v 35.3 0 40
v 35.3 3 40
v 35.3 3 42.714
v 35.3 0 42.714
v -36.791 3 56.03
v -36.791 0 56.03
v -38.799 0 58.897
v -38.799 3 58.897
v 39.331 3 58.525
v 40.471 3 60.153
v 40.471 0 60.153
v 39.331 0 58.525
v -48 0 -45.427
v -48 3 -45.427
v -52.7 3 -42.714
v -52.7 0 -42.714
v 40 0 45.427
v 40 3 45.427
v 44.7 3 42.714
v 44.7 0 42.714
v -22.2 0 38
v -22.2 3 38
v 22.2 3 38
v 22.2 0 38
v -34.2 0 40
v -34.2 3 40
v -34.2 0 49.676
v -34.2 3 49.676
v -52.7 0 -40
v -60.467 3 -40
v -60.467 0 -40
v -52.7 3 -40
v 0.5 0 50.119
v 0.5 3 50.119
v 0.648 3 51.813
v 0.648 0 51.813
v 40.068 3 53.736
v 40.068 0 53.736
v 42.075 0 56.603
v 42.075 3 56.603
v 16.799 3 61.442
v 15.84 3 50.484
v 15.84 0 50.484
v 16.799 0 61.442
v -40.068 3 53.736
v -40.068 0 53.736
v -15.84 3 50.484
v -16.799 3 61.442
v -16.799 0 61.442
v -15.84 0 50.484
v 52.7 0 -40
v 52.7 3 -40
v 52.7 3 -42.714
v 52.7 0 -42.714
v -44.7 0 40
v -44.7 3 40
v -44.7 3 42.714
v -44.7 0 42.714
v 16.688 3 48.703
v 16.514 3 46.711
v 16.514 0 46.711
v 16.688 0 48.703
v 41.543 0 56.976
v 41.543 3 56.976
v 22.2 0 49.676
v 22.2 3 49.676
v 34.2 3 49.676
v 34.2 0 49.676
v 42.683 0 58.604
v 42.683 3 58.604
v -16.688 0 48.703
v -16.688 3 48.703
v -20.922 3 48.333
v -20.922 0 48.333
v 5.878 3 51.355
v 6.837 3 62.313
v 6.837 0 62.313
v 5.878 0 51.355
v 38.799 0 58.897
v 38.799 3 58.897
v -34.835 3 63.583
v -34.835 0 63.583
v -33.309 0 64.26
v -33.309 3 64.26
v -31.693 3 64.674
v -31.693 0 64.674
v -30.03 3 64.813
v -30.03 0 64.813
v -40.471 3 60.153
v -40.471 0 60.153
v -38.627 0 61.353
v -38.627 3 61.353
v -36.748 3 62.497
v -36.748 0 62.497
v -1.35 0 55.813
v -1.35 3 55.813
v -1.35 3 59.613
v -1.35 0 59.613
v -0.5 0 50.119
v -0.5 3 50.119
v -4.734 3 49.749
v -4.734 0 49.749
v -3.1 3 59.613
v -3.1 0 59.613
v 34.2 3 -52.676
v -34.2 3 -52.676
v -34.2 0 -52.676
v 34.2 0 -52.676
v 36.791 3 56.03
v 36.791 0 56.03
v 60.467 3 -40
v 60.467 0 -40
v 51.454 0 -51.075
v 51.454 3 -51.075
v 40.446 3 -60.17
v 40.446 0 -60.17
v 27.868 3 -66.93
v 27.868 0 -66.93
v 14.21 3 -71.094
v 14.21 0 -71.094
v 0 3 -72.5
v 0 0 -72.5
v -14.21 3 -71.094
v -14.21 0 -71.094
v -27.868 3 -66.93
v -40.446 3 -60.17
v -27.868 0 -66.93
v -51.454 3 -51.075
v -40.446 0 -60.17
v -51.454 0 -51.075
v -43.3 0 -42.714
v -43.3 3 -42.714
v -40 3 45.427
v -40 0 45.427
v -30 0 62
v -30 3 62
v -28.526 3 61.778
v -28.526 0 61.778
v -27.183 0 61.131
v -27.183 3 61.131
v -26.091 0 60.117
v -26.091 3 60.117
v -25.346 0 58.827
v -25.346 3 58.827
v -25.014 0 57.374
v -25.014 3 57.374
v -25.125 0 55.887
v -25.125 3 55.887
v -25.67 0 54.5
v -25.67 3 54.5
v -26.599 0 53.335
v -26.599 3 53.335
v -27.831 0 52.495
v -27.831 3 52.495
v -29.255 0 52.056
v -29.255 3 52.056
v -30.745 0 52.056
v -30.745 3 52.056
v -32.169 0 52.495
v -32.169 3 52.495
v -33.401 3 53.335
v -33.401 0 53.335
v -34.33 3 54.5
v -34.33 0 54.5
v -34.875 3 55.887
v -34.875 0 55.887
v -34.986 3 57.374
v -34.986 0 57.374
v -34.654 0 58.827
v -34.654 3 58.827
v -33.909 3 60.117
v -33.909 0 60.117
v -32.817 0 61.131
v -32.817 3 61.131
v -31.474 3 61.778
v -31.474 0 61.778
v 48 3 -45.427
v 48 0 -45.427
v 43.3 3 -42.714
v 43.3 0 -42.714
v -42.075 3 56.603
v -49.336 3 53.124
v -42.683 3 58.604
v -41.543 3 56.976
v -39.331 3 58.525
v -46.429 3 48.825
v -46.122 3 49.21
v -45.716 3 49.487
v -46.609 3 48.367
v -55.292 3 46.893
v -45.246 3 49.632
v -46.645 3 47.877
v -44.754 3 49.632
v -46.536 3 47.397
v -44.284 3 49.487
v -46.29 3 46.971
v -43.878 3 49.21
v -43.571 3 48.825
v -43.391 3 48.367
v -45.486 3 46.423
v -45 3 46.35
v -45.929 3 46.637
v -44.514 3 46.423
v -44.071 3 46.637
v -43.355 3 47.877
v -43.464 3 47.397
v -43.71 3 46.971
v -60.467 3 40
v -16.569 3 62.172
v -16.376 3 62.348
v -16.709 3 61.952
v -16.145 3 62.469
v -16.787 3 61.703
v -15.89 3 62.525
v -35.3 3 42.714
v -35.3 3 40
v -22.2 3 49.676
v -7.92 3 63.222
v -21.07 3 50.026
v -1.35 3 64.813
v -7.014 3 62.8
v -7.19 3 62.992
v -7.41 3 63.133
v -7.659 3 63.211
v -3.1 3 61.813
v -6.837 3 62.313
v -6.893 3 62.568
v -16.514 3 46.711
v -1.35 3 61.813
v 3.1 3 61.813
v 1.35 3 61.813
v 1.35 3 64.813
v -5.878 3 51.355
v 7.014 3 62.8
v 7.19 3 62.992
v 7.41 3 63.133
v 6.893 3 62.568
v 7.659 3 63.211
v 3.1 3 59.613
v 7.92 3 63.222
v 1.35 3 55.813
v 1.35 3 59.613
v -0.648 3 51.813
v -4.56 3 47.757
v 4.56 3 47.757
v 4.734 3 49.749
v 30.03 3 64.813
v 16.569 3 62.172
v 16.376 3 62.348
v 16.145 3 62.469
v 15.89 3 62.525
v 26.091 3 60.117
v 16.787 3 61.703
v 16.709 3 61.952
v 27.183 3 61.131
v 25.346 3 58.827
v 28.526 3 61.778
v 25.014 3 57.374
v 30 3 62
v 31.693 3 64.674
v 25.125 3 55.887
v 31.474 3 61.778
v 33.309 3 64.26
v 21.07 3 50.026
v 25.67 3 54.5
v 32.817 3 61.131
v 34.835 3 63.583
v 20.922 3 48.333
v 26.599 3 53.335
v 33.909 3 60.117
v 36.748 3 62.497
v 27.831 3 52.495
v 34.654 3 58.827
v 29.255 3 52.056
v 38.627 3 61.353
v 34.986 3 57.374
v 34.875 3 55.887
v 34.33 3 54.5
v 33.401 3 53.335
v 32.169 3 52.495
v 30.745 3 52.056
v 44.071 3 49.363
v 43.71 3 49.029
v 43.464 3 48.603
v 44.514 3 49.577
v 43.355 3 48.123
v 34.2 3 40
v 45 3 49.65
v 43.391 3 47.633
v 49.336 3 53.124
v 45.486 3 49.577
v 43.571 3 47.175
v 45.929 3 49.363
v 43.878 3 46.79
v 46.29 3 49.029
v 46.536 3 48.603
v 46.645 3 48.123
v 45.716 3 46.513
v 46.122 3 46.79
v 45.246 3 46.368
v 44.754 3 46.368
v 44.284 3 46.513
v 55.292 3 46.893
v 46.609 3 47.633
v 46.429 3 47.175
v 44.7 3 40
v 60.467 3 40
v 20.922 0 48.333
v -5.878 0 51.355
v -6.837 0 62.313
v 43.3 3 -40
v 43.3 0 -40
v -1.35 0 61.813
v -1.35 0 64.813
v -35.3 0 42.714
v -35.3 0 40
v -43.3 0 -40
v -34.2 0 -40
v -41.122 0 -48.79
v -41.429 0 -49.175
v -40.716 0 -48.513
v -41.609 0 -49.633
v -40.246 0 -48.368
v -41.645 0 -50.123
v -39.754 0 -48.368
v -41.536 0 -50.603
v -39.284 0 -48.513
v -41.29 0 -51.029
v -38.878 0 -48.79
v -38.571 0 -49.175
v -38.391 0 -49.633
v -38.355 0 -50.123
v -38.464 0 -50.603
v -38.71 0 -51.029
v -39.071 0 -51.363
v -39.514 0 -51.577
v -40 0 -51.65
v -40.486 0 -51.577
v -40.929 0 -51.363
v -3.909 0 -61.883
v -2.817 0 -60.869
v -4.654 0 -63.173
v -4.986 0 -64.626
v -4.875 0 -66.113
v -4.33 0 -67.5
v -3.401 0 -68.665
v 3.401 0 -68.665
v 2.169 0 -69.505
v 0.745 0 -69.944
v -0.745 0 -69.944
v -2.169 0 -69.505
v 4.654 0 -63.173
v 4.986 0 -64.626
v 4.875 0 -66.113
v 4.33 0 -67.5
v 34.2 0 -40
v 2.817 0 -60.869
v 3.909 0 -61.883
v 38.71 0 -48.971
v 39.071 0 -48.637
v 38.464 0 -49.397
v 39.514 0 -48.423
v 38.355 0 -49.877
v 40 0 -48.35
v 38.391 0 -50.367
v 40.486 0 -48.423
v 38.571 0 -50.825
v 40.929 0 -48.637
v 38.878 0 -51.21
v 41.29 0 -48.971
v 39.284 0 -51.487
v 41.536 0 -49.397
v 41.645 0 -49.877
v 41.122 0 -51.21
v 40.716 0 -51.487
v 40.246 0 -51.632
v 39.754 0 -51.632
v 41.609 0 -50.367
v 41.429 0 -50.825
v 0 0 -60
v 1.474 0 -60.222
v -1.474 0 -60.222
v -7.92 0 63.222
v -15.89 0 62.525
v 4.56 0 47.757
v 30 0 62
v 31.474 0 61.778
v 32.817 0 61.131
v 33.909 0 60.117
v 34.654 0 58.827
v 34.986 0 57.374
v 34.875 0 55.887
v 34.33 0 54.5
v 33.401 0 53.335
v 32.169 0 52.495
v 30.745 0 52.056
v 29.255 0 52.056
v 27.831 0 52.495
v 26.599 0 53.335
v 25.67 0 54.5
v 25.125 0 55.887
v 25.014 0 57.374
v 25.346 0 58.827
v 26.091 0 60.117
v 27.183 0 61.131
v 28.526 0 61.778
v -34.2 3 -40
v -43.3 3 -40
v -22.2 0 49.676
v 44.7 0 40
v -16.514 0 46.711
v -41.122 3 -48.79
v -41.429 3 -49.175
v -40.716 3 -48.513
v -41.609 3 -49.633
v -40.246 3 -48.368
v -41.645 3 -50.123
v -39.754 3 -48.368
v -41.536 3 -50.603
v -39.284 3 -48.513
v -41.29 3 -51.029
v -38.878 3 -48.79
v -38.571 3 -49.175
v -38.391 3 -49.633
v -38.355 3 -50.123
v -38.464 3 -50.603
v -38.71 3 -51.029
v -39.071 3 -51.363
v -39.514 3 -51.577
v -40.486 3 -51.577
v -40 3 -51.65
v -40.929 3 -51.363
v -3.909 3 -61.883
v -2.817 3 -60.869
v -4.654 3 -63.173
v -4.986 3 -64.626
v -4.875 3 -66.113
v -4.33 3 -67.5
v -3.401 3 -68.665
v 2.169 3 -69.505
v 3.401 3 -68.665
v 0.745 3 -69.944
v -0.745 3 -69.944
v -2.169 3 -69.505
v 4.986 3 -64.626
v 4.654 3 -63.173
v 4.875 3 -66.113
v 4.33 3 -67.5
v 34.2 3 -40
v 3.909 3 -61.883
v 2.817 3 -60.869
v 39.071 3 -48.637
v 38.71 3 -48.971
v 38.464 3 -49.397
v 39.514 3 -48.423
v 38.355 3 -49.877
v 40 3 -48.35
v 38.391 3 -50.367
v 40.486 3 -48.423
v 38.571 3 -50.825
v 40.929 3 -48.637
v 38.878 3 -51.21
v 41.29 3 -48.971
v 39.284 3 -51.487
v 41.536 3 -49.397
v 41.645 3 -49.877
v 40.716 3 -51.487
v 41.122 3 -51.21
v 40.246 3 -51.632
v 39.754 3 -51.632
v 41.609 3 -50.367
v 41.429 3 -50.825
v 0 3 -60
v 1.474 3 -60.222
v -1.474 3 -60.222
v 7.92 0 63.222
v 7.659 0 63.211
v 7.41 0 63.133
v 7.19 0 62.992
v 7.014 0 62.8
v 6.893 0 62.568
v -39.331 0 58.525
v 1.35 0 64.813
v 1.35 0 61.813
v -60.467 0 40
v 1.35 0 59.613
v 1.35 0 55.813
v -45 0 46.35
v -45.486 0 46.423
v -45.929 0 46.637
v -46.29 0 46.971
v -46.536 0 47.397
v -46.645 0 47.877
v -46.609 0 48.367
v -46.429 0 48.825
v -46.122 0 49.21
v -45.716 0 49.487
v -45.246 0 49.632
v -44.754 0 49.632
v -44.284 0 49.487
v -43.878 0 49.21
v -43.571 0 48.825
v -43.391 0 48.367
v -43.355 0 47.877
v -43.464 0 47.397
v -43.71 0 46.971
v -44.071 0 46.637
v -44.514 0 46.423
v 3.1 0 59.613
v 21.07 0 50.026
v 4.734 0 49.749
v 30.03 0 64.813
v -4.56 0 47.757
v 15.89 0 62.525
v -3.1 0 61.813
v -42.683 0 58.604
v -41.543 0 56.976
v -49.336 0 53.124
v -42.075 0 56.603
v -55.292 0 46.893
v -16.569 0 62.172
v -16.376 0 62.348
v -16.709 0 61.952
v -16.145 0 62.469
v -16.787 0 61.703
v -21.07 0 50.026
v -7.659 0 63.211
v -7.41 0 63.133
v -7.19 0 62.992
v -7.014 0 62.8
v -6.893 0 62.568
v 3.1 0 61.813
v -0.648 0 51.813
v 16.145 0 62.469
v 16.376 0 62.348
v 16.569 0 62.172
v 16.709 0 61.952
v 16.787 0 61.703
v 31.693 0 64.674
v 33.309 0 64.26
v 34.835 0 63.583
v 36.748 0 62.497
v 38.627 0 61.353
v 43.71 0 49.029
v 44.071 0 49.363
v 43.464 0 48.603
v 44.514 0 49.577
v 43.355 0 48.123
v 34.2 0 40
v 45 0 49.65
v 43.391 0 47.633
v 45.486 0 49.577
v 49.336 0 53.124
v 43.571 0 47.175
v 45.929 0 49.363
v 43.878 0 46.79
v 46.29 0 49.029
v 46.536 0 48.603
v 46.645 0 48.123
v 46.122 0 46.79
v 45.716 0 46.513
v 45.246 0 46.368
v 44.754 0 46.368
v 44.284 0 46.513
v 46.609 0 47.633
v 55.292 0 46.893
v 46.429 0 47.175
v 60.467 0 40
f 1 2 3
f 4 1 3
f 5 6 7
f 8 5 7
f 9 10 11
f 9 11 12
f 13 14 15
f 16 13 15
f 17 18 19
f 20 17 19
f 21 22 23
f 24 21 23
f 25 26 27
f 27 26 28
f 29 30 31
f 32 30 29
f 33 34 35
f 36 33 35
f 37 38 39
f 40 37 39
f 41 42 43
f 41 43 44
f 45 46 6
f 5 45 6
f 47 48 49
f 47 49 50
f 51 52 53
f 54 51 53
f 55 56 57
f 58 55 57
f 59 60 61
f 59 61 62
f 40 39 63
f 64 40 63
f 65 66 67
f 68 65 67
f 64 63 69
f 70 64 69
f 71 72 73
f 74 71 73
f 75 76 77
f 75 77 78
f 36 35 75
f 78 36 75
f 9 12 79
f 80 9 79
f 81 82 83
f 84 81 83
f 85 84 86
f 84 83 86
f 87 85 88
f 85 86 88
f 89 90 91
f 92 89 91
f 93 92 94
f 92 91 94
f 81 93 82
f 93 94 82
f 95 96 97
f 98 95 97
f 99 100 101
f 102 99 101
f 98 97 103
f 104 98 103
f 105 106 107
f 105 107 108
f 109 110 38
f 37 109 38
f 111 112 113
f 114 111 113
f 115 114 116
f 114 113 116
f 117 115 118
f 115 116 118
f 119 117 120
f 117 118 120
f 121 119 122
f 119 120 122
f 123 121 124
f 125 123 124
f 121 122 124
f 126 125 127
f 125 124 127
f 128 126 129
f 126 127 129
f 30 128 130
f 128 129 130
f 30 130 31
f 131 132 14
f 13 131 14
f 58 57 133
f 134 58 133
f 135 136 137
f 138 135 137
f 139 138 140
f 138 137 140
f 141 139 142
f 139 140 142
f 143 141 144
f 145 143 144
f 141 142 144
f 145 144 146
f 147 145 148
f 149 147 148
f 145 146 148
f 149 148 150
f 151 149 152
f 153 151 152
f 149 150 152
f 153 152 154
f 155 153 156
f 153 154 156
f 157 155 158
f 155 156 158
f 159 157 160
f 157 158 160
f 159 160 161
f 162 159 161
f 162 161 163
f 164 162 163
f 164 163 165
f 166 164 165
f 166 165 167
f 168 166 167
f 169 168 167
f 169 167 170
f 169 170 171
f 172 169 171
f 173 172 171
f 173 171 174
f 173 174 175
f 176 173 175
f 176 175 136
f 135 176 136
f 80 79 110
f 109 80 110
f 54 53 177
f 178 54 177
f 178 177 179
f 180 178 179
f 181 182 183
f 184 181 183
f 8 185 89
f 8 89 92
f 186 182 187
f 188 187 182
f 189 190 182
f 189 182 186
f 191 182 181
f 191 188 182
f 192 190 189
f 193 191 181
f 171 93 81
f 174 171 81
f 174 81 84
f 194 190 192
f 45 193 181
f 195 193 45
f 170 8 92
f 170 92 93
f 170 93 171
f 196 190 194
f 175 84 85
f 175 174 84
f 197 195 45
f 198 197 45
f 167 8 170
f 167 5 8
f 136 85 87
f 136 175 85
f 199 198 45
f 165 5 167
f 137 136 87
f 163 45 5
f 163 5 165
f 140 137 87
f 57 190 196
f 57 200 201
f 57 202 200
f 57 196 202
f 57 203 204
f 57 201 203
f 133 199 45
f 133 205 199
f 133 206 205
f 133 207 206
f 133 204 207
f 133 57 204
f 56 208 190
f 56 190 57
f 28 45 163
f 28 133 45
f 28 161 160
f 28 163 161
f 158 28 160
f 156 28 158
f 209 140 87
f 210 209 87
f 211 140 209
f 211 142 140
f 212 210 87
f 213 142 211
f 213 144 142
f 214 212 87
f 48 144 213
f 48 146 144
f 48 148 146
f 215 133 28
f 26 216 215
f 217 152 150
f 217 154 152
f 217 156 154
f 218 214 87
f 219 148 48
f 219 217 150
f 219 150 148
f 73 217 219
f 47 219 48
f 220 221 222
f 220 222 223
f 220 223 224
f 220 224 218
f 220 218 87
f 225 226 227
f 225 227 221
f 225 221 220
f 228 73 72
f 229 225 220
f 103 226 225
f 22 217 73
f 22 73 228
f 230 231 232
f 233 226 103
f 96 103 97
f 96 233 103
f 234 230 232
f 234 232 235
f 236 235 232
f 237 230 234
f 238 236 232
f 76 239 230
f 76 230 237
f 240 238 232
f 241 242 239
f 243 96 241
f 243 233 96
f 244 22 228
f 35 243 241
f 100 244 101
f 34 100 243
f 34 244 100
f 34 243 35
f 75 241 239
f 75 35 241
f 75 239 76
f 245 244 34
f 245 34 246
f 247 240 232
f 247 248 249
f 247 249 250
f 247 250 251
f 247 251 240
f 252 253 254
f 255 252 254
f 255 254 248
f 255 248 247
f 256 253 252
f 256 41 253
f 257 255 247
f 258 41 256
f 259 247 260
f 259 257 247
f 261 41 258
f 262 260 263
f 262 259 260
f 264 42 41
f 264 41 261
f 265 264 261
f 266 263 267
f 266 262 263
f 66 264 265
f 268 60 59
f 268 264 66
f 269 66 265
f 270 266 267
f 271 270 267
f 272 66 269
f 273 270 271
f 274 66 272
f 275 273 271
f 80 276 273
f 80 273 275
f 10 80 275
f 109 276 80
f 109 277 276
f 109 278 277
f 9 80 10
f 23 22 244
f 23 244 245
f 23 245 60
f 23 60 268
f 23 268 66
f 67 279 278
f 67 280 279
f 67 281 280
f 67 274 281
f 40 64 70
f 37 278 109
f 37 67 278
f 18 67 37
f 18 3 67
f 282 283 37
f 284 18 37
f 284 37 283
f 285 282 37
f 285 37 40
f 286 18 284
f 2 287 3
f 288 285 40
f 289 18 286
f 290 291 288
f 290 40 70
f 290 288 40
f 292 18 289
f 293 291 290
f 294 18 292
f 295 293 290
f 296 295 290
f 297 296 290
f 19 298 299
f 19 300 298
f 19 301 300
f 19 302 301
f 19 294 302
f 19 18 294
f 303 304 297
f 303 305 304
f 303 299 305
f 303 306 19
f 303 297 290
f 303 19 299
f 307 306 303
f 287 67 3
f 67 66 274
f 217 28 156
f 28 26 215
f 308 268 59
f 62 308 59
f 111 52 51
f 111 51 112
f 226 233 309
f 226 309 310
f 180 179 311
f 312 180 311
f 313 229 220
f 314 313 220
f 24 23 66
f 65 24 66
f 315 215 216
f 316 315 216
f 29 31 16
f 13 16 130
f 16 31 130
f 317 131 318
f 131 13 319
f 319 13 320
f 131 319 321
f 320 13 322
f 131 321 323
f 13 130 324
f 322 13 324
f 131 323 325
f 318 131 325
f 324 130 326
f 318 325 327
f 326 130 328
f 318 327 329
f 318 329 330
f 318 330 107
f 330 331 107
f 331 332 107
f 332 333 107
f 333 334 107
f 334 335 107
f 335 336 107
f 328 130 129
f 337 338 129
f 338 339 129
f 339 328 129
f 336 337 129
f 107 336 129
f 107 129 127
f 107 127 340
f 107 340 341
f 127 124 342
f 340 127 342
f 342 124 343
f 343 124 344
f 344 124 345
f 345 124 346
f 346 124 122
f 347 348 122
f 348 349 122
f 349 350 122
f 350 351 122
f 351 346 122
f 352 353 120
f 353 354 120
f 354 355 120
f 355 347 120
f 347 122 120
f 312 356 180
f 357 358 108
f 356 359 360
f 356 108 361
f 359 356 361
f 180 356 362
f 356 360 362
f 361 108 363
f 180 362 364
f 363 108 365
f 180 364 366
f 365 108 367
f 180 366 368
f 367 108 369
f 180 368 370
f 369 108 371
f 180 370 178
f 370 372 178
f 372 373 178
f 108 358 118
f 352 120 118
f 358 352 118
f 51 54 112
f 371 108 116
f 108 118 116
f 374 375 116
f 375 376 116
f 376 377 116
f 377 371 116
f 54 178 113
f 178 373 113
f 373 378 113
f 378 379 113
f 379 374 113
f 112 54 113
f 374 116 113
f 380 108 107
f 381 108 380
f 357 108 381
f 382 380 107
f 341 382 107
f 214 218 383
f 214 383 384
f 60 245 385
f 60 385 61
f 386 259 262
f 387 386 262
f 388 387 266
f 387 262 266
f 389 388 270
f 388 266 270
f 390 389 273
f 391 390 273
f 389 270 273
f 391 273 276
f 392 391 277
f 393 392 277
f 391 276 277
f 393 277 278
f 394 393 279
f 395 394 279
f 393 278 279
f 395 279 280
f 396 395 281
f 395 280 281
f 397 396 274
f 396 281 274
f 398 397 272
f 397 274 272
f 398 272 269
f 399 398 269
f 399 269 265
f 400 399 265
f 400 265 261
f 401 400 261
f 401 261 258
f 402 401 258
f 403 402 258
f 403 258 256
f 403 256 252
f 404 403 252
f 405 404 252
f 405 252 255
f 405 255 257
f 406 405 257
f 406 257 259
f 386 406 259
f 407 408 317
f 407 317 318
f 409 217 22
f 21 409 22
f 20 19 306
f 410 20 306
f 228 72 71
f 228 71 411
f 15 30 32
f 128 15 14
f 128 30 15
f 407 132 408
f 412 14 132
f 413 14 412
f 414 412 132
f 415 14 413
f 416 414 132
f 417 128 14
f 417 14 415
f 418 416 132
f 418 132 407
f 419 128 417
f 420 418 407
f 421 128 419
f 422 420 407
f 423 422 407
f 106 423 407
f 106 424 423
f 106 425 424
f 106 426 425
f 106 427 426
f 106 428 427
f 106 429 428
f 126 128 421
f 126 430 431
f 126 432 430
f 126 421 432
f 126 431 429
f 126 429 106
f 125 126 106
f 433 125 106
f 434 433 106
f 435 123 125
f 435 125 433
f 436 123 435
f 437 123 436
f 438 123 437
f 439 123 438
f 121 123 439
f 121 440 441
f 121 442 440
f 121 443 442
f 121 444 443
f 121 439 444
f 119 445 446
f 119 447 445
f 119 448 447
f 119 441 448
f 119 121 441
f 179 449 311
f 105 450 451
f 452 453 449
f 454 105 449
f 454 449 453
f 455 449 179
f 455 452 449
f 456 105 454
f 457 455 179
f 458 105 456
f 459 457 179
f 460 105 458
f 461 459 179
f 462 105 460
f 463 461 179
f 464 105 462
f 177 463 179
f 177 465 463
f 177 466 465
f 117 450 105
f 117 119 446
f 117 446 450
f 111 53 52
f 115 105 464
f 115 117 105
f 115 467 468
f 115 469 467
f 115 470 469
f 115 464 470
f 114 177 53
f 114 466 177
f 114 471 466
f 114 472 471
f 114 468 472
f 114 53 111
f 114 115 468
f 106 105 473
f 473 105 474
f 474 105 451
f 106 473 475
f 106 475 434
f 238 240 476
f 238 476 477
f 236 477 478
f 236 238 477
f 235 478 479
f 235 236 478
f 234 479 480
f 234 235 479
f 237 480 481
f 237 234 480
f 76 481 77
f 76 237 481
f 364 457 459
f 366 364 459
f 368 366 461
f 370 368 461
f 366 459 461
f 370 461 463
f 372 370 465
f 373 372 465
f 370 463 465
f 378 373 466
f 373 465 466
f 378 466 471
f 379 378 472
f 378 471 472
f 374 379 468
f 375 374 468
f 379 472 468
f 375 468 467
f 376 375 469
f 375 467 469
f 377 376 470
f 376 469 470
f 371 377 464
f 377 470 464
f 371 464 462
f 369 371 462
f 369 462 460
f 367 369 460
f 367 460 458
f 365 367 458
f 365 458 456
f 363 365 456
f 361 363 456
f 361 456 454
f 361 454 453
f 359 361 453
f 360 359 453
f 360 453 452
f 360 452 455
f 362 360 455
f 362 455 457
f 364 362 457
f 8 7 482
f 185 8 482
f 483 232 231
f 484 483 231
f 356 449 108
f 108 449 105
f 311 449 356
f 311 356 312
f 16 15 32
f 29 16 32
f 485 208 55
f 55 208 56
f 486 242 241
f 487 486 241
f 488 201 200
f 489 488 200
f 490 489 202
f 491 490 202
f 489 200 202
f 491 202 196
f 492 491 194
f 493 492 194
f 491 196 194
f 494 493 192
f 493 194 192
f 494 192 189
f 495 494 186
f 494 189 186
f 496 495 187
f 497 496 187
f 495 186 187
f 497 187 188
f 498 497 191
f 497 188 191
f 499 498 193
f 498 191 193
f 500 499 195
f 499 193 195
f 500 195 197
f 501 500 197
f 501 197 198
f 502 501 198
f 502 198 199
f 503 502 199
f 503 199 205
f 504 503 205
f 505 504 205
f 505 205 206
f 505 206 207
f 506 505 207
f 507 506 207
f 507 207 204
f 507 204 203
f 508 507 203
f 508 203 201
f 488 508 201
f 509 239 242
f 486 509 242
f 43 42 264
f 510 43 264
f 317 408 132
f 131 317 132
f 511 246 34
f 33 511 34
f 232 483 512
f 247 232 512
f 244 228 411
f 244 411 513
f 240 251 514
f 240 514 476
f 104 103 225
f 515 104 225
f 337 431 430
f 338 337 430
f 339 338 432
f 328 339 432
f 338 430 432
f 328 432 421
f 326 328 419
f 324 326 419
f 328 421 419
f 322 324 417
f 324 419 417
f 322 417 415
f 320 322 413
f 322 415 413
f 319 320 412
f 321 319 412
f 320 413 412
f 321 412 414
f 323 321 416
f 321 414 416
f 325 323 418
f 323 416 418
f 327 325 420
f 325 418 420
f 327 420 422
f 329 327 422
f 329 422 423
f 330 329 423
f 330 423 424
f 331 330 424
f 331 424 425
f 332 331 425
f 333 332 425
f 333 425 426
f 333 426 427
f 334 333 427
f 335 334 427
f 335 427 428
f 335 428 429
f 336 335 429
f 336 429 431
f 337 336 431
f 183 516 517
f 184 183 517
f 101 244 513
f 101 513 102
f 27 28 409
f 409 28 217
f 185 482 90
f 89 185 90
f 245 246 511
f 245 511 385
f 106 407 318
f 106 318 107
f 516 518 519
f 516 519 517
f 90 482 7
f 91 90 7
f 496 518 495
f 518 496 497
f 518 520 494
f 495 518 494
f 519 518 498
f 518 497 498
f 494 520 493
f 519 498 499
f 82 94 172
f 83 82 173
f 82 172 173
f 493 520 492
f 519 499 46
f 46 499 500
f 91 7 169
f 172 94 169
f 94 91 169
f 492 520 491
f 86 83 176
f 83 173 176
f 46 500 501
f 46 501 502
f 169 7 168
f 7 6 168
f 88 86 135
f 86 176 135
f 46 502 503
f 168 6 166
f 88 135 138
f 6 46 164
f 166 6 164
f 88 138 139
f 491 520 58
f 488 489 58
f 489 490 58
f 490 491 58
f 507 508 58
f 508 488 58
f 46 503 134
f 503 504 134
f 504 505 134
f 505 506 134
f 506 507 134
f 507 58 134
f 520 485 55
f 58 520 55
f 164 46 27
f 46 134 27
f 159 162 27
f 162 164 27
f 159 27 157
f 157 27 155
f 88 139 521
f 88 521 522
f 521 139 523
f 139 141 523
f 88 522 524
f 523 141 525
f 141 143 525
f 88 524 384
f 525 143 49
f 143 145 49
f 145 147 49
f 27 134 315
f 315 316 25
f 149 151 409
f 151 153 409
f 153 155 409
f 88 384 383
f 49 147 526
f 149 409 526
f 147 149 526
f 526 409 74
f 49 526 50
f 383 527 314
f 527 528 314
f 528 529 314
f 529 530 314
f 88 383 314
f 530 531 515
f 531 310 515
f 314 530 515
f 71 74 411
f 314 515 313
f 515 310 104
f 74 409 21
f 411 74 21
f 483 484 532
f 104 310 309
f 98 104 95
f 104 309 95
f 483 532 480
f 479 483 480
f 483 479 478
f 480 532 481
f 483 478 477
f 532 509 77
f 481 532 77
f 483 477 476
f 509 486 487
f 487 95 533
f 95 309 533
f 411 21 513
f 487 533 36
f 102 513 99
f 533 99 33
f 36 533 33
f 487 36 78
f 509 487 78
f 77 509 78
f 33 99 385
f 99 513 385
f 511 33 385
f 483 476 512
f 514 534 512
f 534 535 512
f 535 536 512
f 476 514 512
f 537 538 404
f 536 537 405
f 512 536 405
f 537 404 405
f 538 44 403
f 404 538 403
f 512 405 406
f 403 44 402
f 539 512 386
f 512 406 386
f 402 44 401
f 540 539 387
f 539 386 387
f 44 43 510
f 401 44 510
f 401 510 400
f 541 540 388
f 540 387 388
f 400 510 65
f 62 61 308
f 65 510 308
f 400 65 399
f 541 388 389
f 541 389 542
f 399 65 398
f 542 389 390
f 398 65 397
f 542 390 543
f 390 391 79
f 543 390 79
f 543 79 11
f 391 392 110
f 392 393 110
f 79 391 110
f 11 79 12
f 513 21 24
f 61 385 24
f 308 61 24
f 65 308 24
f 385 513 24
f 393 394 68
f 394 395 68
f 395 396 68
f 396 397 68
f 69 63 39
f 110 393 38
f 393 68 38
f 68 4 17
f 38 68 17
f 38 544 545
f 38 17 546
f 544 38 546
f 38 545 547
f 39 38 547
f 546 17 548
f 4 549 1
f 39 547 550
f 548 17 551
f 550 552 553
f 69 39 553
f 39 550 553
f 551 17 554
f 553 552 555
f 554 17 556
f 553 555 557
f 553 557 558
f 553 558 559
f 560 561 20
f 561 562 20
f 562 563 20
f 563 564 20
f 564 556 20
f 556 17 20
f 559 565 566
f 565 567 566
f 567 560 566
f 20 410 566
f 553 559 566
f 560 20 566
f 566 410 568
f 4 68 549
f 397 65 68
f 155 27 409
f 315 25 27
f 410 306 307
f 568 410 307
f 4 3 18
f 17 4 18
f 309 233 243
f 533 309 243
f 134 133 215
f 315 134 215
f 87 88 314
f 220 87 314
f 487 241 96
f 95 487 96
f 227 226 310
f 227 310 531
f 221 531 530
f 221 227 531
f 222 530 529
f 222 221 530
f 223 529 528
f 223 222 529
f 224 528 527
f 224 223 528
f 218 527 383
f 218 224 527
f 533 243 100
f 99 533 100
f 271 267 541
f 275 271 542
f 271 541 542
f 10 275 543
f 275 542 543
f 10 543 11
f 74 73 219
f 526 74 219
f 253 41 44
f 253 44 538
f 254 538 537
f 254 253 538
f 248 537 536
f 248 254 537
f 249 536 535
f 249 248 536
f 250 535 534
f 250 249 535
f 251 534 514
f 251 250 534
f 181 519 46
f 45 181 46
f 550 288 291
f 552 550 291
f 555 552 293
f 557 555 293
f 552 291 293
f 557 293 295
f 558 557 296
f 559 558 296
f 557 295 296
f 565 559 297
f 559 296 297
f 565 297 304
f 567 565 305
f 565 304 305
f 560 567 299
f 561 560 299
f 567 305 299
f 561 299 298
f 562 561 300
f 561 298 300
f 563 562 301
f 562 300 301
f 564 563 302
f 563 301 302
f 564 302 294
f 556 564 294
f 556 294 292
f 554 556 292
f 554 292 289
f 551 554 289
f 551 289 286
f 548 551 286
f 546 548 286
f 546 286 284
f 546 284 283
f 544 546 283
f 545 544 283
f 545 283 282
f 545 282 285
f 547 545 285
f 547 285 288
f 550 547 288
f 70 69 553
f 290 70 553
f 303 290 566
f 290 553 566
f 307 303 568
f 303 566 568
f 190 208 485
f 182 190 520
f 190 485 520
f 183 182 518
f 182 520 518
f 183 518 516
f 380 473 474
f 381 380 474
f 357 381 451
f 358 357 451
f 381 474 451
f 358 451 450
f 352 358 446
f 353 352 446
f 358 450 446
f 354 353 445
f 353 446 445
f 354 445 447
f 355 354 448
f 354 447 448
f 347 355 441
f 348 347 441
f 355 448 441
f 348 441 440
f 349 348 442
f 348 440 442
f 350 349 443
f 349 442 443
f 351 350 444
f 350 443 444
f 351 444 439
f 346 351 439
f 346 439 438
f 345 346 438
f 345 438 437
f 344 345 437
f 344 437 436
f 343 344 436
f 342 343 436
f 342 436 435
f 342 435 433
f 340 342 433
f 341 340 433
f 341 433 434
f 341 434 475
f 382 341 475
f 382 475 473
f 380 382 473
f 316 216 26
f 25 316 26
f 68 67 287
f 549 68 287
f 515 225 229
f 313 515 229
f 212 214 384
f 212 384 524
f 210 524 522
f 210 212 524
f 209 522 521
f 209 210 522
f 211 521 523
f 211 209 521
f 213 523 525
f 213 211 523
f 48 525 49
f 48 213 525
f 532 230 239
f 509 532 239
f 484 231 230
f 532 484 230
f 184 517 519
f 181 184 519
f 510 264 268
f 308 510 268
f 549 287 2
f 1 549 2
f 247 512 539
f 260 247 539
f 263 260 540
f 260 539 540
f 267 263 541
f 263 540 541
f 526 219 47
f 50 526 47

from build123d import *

# Parameters (mm, degrees)
BOSS_EXTRUDE1_DEPTH = 3
CUT_EXTRUDE1_DEPTH  = 103.574363269
SKETCH3_W           = 38.3
SKETCH3_H           = 80
CUT_EXTRUDE2_DEPTH  = 103.574363269
CUT_EXTRUDE3_DEPTH  = 95.453692358
CUT_EXTRUDE4_DEPTH  = 95.453692358
SKETCH6_W           = 68.4
SKETCH6_H           = 3
CUT_EXTRUDE5_DEPTH  = 95.453692358
SKETCH7_R           = 5
CUT_EXTRUDE6_DEPTH  = 95.453692358
CUT_EXTRUDE7_DEPTH  = 95.453692358
SKETCH11_R          = 5
CUT_EXTRUDE10_DEPTH = 95.453692358
CUT_EXTRUDE11_DEPTH = 95.453692358
SKETCH13_R          = 1.65
CUT_EXTRUDE12_DEPTH = 95.453692358
CUT_EXTRUDE13_DEPTH = 95.453692358


with BuildPart() as part:
    # Sketch1 → Boss-Extrude1 (new body)
    with BuildSketch(Plane(origin=(0, 0, 0), x_dir=(1, 0, 0), z_dir=(0, 1, 0))):
        with BuildLine():
            Line((-30.029977361, -64.812867647), (30.029977361, -64.812867647))
            ThreePointArc((30.029977361, -64.812867647), (32.509837414, -64.500503794), (34.834773739, -63.582926471))
            ThreePointArc((34.834773739, -63.582926471), (0, 72.5), (-34.834773739, -63.582926471))
            ThreePointArc((-34.834773739, -63.582926471), (-32.509837414, -64.500503794), (-30.029977361, -64.812867647))
        make_face()
    extrude(amount=BOSS_EXTRUDE1_DEPTH)

    # Sketch2 → Cut-Extrude1 (cut, through all)
    with BuildSketch(Plane(origin=(0, 3, 0), x_dir=(1, 0, 0), z_dir=(0, 1, 0))):
        Polygon((-22.2, -49.675685802), (-22.2, -38), (22.2, -38), (22.2, -49.675685802), (34.2, -49.675685802), (34.2, 49.675685802), (22.2, 49.675685802), (22.2, 44), (-22.2, 44), (-22.2, 49.675685802), (-34.2, 49.675685802), (-34.2, -49.675685802), align=None)
    extrude(amount=-CUT_EXTRUDE1_DEPTH, mode=Mode.SUBTRACT)

    # Sketch3 → Cut-Extrude2 (cut, through all)
    with BuildSketch(Plane(origin=(0, 3, 0), x_dir=(1, 0, 0), z_dir=(0, 1, 0))):
        with Locations((-53.35, 0)):
            Rectangle(SKETCH3_W, SKETCH3_H)
        with Locations((53.35, 0)):
            Rectangle(SKETCH3_W, SKETCH3_H)
    extrude(amount=-CUT_EXTRUDE2_DEPTH, mode=Mode.SUBTRACT)


with BuildPart() as cut_extrude2_piece_1:
    # of the separate pieces the step leaves, piece 1, a body of its own (cut_extrude2_pieces)
    add(part.part.solids().sort_by_distance((60.466933112, 0, -40))[0])

    # Sketch6 → Cut-Extrude5 (cut, through all)
    with BuildSketch(Plane(origin=(0, 3, 0), x_dir=(1, 0, 0), z_dir=(0, 1, 0))):
        with Locations((0, 51.175685802)):
            Rectangle(SKETCH6_W, SKETCH6_H)
    extrude(amount=-CUT_EXTRUDE5_DEPTH, mode=Mode.SUBTRACT)


with BuildPart() as cut_extrude2_piece_2:
    # of the separate pieces the step leaves, piece 2, a body of its own (cut_extrude2_pieces)
    add(part.part.solids().sort_by_distance((-34.834773739, 0, 63.582926471))[0])

    # Sketch4 → Cut-Extrude3 (cut, through all)
    with BuildSketch(Plane(origin=(0, 3, 0), x_dir=(1, 0, 0), z_dir=(0, 1, 0))):
        Polygon((-21.070156074, -50.026174921), (-0.648164763, -51.812867647), (-0.5, -50.11933666), (-20.921991311, -48.332643934), align=None)
        Polygon((21.070156074, -50.026174921), (20.921991311, -48.332643934), (0.5, -50.11933666), (0.648164763, -51.812867647), align=None)
    extrude(amount=-CUT_EXTRUDE3_DEPTH, mode=Mode.SUBTRACT)

    # Sketch5 → Cut-Extrude4 (cut, through all)
    with BuildSketch(Plane(origin=(0, 3, 0), x_dir=(1, 0, 0), z_dir=(0, 1, 0))):
        with BuildLine():
            Line((5.878186928, -51.355299998), (15.840133909, -50.48374257))
            Line((15.840133909, -50.48374257), (16.798847079, -61.441884249))
            ThreePointArc((16.798847079, -61.441884249), (16.568696824, -62.171827602), (15.889808123, -62.52523469))
            Line((15.889808123, -62.52523469), (7.920250539, -63.222480632))
            ThreePointArc((7.920250539, -63.222480632), (7.190307186, -62.992330377), (6.836900098, -62.313441677))
            Line((6.836900098, -62.313441677), (5.878186928, -51.355299998))
        make_face()
        Polygon((16.688163844, -48.703055841), (4.733827467, -49.748924754), (4.559515981, -47.756535357), (16.513852358, -46.710666444), align=None)
        Polygon((-16.513852358, -46.710666444), (-4.559515981, -47.756535357), (-4.733827467, -49.748924754), (-16.688163844, -48.703055841), align=None)
        with BuildLine():
            Line((-7.920250539, -63.222480632), (-15.889808123, -62.52523469))
            ThreePointArc((-15.889808123, -62.52523469), (-16.568696824, -62.171827602), (-16.798847079, -61.441884249))
            Line((-16.798847079, -61.441884249), (-15.840133909, -50.48374257))
            Line((-15.840133909, -50.48374257), (-5.878186928, -51.355299998))
            Line((-5.878186928, -51.355299998), (-6.836900098, -62.313441677))
            ThreePointArc((-6.836900098, -62.313441677), (-7.190307186, -62.992330377), (-7.920250539, -63.222480632))
        make_face()
    extrude(amount=-CUT_EXTRUDE4_DEPTH, mode=Mode.SUBTRACT)

    # Sketch7 → Cut-Extrude6 (cut, through all)
    with BuildSketch(Plane(origin=(0, 3, 0), x_dir=(1, 0, 0), z_dir=(0, 1, 0))):
        with Locations(Location((-30, -57, 0), (0, 0, 270))):
            Circle(SKETCH7_R)
        with Locations(Location((30, -57, 0), (0, 0, 270))):
            Circle(SKETCH7_R)
    extrude(amount=-CUT_EXTRUDE6_DEPTH, mode=Mode.SUBTRACT)


with BuildPart() as cut_extrude5_kept_piece:
    # of the separate pieces the step leaves, the one the design keeps (cut_extrude5_pieces_kept)
    add(cut_extrude2_piece_1.part.solids().sort_by_distance((60.466933112, 0, -40))[0])


with BuildPart() as cut_extrude7_tool:
    # Sketch8 → Cut-Extrude7 (new, through all)
    with BuildSketch(Plane(origin=(0, 3, 0), x_dir=(1, 0, 0), z_dir=(0, 1, 0))):
        Polygon((-52.7, 37.286453735), (-52.7, 32.5), (-43.3, 32.5), (-43.3, 37.286453735), (-43.3, 42.713546265), (-48, 45.42709253), (-52.7, 42.713546265), align=None)
        Polygon((44.7, -32.5), (35.3, -32.5), (35.3, -37.286453735), (35.3, -42.713546265), (40, -45.42709253), (44.7, -42.713546265), (44.7, -37.286453735), align=None)
        Polygon((-35.3, -37.286453735), (-35.3, -32.5), (-44.7, -32.5), (-44.7, -37.286453735), (-44.7, -42.713546265), (-40, -45.42709253), (-35.3, -42.713546265), align=None)
        Polygon((52.7, 32.5), (52.7, 37.286453735), (52.7, 42.713546265), (48, 45.42709253), (43.3, 42.713546265), (43.3, 37.286453735), (43.3, 32.5), align=None)
    extrude(amount=-CUT_EXTRUDE7_DEPTH)


with BuildPart() as cut_extrude2_piece_2_1:
    add(cut_extrude2_piece_2.part)

    # Cut-Extrude7: cut by cut_extrude7_tool
    add(cut_extrude7_tool.part, mode=Mode.SUBTRACT)

    # Sketch12 → Cut-Extrude11 (cut, through all)
    with BuildSketch(Plane(origin=(0, 3, 0), x_dir=(1, 0, 0), z_dir=(0, 1, 0))):
        Polygon((-1.35, -64.812867647), (1.35, -64.812867647), (1.35, -61.812867647), (3.1, -61.812867647), (3.1, -59.612867647), (1.35, -59.612867647), (1.35, -55.812867647), (-1.35, -55.812867647), (-1.35, -59.612867647), (-3.1, -59.612867647), (-3.1, -61.812867647), (-1.35, -61.812867647), align=None)
    extrude(amount=-CUT_EXTRUDE11_DEPTH, mode=Mode.SUBTRACT)


with BuildPart() as cut_extrude5_kept_piece_1:
    add(cut_extrude5_kept_piece.part)

    # Cut-Extrude7: cut by cut_extrude7_tool
    add(cut_extrude7_tool.part, mode=Mode.SUBTRACT)

    # Sketch11 → Cut-Extrude10 (cut, through all)
    with BuildSketch(Plane(origin=(0, 3, 0), x_dir=(1, 0, 0), z_dir=(0, 1, 0))):
        with Locations(Location((0, 65, 0), (0, 0, 270))):
            Circle(SKETCH11_R)
    extrude(amount=-CUT_EXTRUDE10_DEPTH, mode=Mode.SUBTRACT)


with BuildPart() as cut_extrude12_tool:
    # Sketch13 → Cut-Extrude12 (new, through all)
    with BuildSketch(Plane(origin=(0, 3, 0), x_dir=(1, 0, 0), z_dir=(0, 1, 0))):
        with Locations(Location((45, -48, 0), (0, 0, 270))):
            Circle(SKETCH13_R)
        with Locations(Location((-45, -48, 0), (0, 0, 90))):
            Circle(SKETCH13_R)
        with Locations(Location((40, 50, 0), (0, 0, 270))):
            Circle(SKETCH13_R)
        with Locations(Location((-40, 50, 0), (0, 0, 90))):
            Circle(SKETCH13_R)
    extrude(amount=-CUT_EXTRUDE12_DEPTH)


with BuildPart() as cut_extrude2_piece_2_2:
    add(cut_extrude2_piece_2_1.part)

    # Cut-Extrude12: cut by cut_extrude12_tool
    add(cut_extrude12_tool.part, mode=Mode.SUBTRACT)

    # Sketch14 → Cut-Extrude13 (cut, through all)
    with BuildSketch(Plane.XZ):
        Polygon((-41.542994023, 56.975890933), (-42.075442851, 56.60306625), (-40.067925324, 53.736034095), (-36.791317147, 56.03033984), (-38.798834674, 58.897371995), (-39.331283503, 58.524547311), (-40.478436376, 60.1628514), (-42.690146895, 58.614195022), align=None)
        Polygon((41.542994023, 56.975890933), (42.690146895, 58.614195022), (40.478436376, 60.1628514), (39.331283503, 58.524547311), (38.798834674, 58.897371995), (36.791317147, 56.03033984), (40.067925324, 53.736034095), (42.075442851, 56.60306625), align=None)
    extrude(amount=-CUT_EXTRUDE13_DEPTH, mode=Mode.SUBTRACT)


with BuildPart() as cut_extrude5_kept_piece_2:
    add(cut_extrude5_kept_piece_1.part)

    # Cut-Extrude12: cut by cut_extrude12_tool
    add(cut_extrude12_tool.part, mode=Mode.SUBTRACT)


solid = Compound([cut_extrude2_piece_2_2.part, cut_extrude5_kept_piece_2.part])
